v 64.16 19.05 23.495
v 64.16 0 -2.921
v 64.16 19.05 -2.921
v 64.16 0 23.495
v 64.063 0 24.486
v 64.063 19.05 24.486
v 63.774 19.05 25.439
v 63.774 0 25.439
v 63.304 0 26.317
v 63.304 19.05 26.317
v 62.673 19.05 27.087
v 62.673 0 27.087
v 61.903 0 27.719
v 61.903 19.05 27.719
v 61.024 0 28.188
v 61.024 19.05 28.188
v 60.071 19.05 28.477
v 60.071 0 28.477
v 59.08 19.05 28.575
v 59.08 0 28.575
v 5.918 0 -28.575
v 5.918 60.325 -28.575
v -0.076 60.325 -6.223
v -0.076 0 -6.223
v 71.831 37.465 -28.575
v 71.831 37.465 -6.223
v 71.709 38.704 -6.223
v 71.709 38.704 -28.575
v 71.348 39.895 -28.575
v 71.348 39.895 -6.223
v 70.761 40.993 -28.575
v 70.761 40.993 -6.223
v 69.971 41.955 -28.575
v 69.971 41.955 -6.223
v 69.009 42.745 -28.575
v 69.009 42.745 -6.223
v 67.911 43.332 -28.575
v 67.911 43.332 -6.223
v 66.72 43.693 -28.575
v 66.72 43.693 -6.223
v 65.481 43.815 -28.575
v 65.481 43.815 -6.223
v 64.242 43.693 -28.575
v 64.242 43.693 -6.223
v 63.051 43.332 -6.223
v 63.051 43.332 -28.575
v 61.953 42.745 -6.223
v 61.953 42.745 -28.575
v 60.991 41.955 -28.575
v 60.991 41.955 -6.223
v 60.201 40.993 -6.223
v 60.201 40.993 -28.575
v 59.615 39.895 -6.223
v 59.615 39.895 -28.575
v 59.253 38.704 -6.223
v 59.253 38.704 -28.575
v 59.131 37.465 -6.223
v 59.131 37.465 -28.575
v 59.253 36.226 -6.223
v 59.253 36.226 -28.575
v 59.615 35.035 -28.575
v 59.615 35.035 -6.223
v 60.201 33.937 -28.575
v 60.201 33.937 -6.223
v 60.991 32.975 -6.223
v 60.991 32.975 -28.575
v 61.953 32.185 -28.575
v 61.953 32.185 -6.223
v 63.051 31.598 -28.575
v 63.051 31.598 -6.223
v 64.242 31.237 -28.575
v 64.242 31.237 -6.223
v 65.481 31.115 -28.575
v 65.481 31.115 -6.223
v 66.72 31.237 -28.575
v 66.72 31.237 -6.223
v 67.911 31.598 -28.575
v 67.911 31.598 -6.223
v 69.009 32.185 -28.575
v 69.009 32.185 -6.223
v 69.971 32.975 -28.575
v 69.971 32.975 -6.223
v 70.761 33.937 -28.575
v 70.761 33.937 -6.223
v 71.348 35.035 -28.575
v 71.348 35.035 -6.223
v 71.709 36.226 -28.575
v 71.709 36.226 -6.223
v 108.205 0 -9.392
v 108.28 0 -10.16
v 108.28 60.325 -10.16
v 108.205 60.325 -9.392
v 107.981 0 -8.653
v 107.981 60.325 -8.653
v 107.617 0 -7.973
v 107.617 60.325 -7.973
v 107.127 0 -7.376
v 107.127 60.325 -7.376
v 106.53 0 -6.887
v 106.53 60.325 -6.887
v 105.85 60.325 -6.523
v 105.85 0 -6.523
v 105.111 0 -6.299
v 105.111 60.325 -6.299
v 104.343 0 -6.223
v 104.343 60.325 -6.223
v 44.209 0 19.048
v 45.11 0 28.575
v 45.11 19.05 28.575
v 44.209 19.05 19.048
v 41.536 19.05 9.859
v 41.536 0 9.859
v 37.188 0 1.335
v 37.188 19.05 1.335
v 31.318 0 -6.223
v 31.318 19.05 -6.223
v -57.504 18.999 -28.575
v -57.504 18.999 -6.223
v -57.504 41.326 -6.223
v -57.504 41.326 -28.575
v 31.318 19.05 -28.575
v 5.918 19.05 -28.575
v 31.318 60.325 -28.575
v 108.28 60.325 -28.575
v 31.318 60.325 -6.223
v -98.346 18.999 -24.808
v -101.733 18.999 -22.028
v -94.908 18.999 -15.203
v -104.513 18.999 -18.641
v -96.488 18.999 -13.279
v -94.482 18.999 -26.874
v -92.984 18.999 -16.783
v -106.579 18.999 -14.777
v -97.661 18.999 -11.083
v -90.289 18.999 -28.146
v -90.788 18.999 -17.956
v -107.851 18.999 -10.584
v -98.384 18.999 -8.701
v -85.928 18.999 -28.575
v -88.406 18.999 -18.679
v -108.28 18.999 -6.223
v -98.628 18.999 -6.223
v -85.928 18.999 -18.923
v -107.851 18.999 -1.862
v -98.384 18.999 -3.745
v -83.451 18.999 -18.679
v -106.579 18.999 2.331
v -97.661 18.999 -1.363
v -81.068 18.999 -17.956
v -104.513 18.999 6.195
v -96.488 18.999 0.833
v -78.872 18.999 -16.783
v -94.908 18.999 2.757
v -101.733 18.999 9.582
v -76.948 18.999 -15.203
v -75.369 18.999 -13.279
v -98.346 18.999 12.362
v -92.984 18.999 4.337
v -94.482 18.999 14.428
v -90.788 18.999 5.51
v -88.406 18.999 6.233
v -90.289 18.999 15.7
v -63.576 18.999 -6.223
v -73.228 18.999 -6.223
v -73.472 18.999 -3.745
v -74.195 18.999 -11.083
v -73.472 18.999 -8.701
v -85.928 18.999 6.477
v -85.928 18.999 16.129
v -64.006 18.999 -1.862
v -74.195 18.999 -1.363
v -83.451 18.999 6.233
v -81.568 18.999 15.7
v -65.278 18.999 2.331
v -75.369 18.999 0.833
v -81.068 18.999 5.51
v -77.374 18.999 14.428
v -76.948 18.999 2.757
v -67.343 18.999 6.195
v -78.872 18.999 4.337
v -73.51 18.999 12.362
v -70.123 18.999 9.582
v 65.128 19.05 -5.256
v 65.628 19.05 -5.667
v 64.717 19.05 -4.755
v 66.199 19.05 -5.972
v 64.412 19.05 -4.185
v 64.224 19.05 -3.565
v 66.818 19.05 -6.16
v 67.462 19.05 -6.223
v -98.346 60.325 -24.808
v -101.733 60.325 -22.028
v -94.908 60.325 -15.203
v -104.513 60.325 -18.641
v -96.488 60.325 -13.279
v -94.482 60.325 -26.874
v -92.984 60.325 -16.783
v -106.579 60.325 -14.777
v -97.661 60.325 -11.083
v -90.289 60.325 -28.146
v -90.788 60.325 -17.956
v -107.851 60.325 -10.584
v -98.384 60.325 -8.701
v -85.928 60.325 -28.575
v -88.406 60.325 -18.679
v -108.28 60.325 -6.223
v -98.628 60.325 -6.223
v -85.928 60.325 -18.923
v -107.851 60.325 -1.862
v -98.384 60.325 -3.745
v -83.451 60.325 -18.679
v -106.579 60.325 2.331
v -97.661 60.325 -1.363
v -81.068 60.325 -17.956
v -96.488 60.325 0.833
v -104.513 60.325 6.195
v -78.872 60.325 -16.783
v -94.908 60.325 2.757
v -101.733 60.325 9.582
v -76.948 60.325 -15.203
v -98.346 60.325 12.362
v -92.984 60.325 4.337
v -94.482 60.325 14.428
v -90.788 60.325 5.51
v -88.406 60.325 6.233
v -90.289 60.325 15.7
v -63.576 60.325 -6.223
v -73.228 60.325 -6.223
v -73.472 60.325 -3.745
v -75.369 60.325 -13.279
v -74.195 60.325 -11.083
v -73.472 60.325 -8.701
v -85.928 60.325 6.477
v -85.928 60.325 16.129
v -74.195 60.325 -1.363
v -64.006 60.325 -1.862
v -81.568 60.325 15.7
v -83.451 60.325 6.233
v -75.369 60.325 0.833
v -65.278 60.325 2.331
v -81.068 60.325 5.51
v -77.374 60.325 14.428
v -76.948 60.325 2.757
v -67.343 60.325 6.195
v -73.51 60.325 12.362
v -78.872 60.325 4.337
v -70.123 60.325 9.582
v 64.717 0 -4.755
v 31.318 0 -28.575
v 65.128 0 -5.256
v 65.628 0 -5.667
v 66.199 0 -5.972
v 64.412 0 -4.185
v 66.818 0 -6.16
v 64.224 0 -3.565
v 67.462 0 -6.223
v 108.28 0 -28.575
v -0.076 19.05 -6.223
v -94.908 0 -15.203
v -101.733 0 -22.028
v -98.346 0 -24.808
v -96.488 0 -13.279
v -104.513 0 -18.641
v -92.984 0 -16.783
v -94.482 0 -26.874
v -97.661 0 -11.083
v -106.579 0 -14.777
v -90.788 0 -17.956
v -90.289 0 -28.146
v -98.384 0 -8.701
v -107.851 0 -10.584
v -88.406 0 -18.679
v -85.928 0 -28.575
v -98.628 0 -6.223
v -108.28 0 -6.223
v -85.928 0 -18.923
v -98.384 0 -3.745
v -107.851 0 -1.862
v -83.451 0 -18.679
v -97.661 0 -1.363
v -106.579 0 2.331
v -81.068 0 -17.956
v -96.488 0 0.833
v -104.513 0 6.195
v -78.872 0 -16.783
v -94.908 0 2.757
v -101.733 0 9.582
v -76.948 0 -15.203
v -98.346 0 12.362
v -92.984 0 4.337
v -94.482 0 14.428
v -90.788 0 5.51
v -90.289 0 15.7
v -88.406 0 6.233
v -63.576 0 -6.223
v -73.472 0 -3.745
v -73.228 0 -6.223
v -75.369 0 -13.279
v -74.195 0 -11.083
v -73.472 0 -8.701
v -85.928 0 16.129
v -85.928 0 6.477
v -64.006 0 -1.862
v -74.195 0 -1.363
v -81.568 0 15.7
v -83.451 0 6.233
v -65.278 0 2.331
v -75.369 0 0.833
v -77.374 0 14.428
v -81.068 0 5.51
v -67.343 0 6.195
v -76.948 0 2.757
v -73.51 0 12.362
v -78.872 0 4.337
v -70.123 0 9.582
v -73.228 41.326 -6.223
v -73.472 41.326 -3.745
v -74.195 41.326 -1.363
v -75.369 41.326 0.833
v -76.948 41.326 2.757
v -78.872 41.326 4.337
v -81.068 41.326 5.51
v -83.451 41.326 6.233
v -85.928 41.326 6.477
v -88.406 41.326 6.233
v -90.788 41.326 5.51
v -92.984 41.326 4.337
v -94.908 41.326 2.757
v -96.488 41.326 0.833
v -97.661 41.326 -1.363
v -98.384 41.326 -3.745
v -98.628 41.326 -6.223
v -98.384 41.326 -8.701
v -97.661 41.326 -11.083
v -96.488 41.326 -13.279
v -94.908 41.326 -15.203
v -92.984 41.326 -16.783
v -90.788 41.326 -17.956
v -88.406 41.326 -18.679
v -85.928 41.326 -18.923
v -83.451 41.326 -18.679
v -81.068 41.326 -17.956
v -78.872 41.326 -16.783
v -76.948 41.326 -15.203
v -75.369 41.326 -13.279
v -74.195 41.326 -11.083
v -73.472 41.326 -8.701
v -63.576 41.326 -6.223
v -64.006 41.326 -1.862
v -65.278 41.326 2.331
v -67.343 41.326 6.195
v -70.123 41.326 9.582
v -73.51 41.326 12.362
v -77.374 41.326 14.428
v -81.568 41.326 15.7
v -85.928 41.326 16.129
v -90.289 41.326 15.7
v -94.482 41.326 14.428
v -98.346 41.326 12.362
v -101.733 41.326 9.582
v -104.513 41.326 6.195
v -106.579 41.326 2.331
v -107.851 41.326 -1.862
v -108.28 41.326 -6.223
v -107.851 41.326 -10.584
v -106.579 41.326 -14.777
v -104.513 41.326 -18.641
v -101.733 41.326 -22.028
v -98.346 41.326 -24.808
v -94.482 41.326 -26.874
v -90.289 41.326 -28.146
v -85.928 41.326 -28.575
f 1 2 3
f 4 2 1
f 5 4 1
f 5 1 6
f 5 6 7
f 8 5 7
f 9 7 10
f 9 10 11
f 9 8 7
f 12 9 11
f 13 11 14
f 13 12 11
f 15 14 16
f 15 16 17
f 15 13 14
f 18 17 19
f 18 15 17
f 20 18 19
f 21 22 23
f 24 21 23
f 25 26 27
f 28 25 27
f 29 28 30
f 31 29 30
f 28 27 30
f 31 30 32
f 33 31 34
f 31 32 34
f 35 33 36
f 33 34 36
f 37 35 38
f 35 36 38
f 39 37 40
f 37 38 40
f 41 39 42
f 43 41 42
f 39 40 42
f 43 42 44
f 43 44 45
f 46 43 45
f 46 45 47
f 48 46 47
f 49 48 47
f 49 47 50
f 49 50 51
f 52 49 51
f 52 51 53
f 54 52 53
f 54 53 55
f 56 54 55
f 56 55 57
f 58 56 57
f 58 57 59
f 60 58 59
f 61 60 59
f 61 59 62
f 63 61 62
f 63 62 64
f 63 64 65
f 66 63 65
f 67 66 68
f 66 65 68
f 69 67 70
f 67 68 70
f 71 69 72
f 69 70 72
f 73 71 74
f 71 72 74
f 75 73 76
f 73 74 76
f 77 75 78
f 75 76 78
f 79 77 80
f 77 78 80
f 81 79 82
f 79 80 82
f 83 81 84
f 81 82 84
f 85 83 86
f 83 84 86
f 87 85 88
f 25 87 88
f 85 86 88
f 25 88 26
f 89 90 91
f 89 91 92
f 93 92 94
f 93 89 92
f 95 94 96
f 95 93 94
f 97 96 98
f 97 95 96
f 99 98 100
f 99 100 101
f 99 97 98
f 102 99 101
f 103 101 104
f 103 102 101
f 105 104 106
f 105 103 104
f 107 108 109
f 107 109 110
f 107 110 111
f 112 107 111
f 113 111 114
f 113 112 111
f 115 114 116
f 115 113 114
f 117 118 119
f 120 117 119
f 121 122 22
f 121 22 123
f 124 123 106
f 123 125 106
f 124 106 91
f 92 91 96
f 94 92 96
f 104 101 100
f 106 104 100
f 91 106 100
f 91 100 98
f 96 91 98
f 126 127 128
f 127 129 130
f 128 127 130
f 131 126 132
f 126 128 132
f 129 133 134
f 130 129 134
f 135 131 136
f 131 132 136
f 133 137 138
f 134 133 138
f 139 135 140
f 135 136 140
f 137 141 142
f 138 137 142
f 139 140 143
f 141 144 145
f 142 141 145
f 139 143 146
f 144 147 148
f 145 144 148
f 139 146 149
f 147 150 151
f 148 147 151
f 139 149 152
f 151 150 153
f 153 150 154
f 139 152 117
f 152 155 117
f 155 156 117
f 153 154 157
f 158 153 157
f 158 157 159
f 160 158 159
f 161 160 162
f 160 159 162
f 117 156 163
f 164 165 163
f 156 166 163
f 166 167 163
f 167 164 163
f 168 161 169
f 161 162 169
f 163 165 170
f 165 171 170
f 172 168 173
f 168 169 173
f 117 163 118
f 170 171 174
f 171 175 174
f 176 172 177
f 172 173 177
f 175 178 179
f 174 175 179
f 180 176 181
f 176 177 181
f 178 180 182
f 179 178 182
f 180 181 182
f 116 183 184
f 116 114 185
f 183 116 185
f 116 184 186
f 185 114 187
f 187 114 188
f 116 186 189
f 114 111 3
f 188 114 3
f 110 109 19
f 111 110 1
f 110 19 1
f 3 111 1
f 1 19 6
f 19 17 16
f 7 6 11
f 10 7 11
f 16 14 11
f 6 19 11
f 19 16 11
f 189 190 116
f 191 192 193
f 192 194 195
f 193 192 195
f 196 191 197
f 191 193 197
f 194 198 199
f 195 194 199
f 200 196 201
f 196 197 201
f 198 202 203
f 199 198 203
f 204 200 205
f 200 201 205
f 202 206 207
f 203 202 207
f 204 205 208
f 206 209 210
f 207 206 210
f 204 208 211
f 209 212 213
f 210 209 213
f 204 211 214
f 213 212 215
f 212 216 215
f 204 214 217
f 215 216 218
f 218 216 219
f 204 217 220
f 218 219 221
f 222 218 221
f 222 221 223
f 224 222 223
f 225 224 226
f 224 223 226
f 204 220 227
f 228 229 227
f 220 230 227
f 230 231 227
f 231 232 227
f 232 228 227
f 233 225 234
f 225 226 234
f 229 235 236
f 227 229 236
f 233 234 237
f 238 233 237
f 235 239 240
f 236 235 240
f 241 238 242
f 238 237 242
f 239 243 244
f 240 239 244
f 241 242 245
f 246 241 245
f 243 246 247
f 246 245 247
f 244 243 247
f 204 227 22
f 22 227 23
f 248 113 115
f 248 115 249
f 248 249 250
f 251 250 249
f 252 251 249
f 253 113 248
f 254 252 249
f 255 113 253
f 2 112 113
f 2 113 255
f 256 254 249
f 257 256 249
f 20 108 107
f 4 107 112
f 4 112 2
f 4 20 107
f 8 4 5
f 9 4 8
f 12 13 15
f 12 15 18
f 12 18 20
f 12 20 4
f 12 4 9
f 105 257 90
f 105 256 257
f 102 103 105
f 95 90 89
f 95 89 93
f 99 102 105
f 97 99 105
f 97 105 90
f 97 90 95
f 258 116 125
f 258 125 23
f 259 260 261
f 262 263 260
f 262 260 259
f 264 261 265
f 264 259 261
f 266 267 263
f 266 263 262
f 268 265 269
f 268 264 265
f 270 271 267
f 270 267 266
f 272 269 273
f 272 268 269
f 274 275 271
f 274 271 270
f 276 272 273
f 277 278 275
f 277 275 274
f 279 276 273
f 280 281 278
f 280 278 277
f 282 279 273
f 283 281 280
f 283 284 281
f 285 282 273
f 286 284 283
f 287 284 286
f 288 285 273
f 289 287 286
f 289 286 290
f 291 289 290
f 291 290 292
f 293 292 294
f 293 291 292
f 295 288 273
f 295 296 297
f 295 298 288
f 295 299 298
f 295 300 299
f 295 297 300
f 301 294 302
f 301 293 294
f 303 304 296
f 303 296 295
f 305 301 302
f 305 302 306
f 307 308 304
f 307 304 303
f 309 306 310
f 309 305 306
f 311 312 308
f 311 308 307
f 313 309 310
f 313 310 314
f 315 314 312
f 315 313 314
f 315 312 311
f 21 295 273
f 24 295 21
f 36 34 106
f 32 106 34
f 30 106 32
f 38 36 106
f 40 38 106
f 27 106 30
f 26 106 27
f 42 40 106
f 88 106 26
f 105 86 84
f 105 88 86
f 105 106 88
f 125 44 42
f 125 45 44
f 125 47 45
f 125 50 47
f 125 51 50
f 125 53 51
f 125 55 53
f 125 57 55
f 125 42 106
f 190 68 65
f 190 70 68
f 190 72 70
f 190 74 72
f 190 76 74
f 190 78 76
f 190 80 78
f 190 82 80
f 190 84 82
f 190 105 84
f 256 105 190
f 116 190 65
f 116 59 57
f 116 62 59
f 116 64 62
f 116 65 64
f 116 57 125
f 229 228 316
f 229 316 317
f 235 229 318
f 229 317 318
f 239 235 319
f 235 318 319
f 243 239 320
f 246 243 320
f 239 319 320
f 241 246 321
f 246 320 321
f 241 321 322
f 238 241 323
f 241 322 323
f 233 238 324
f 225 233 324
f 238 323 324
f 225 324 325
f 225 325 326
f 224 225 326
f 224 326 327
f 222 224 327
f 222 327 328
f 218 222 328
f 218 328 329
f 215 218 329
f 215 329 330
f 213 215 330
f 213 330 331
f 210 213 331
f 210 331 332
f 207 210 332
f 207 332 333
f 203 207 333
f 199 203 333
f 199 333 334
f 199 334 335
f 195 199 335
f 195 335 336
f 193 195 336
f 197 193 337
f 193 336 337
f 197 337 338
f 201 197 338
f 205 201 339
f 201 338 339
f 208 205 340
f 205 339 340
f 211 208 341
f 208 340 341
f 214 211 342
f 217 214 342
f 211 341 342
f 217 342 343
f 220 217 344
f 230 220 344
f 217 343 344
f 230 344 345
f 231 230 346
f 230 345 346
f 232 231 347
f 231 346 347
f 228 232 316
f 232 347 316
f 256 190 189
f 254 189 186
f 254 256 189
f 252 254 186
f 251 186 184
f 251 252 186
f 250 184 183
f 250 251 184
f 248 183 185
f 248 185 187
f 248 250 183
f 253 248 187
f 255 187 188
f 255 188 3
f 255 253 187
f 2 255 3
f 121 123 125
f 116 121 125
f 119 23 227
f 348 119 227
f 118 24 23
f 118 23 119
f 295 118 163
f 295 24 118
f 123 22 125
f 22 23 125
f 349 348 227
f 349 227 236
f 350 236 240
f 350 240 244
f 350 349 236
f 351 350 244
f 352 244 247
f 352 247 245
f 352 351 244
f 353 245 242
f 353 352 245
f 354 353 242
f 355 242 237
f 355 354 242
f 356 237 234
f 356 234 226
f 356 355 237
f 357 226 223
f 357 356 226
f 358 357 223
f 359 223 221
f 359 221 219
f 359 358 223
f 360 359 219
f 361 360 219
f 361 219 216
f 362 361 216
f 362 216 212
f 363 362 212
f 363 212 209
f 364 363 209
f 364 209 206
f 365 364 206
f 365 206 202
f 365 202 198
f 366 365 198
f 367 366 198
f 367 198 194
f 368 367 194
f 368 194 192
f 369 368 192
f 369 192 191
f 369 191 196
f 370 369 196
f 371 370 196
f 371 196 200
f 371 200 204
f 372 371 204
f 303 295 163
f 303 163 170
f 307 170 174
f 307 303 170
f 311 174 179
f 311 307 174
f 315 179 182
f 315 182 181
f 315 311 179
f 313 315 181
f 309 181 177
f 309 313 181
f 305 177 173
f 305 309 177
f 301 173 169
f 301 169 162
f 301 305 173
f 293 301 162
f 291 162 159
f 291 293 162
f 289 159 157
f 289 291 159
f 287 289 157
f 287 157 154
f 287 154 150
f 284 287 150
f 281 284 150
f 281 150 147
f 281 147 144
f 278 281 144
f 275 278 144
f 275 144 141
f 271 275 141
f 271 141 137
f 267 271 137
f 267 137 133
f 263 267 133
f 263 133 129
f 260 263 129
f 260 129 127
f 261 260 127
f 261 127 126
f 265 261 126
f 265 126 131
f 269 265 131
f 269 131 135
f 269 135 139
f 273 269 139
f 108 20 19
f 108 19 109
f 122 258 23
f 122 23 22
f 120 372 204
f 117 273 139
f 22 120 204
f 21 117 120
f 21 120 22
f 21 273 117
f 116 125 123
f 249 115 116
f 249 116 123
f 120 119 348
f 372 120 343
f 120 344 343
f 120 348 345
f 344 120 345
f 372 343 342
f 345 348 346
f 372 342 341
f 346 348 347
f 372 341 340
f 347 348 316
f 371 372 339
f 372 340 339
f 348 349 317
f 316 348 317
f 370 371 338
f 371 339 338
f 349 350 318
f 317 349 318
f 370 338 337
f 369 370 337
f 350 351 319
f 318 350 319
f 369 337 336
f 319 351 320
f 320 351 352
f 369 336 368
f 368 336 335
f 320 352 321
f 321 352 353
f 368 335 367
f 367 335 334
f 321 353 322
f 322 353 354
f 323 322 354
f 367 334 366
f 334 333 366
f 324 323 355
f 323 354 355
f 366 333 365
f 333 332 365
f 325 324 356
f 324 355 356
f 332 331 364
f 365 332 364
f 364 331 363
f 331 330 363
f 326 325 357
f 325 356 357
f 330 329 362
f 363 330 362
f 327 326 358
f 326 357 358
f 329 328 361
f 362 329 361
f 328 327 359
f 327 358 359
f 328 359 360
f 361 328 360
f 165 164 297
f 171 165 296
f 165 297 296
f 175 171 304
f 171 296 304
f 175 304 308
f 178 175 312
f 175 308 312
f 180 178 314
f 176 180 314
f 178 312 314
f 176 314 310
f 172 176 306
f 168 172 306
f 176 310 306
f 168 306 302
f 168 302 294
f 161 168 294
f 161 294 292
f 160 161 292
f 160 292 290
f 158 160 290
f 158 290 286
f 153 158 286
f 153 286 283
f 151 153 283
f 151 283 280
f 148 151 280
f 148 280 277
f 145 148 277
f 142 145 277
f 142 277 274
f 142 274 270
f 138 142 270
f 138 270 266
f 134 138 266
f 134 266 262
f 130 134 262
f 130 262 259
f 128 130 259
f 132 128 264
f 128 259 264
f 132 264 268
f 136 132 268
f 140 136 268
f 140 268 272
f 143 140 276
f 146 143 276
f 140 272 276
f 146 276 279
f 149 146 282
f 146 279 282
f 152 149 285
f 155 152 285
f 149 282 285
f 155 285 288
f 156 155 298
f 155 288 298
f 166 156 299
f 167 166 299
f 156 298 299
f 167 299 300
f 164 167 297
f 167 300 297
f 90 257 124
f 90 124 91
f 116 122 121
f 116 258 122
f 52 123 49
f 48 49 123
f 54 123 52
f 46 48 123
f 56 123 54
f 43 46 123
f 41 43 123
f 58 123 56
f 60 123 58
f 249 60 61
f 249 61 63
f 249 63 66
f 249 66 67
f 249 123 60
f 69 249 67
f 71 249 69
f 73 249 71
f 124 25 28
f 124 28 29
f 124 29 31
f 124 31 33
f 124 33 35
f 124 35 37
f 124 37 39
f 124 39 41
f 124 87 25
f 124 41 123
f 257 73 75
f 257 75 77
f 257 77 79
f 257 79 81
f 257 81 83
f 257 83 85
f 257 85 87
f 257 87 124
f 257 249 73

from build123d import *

# Parameters (mm, degrees)
F1_DEPTH = 60.325
F2_DEPTH = 19.05
F0_R     = 12.7
F3_DEPTH = 60.325
F4_DEPTH = 60.325
F5_DEPTH = 19.05
F6_W     = 6.072669208
F6_H     = 22.3266
F6_W_2   = 55.7985371435
F7_DEPTH = 105.41
F8_R     = 6.35
F9_DEPTH = 22.353


with BuildPart() as f1:
    # F0 (on Front) → F1 (new body)
    with BuildSketch(Plane.XZ):
        with BuildLine():
            Line((31.3182, -28.575), (108.2802, -28.575))
            Line((108.2802, -28.575), (108.2802, -10.16))
            ThreePointArc((108.2802, -10.16), (107.1270793975, -7.3761206025), (104.3432, -6.223))
            Line((104.3432, -6.223), (67.4624, -6.223))
            Line((67.4624, -6.223), (31.3182, -6.223))
            Line((31.3182, -6.223), (31.3182, -28.575))
        make_face()
    extrude(amount=-F1_DEPTH)

    # F0 (on Front) → F2 (join)
    with BuildSketch(Plane.XZ):
        with BuildLine():
            ThreePointArc((45.1104, 28.575), (41.5362153616, 9.8593576341), (31.3182, -6.223))
            Line((31.3182, -6.223), (67.4624, -6.223))
            ThreePointArc((67.4624, -6.223), (65.1275334085, -5.2558665915), (64.1604, -2.921))
            Line((64.1604, -2.921), (64.1604, 23.495))
            ThreePointArc((64.1604, 23.495), (62.6725024484, 27.0871024484), (59.0804, 28.575))
            Line((59.0804, 28.575), (45.1104, 28.575))
        make_face()
    extrude(amount=-F2_DEPTH)

    # F8 (on face) → F9 (cut, through all)
    with BuildSketch(Plane.XY.offset(-6.223)):
        with Locations((65.4812, 37.465)):
            Circle(F8_R)
    extrude(amount=-F9_DEPTH, mode=Mode.SUBTRACT)


with BuildPart() as f3:
    # F0 (on Front) → F3 (new body)
    with BuildSketch(Plane.XZ):
        with BuildLine():
            Line((-85.9282, -28.575), (5.9182, -28.575))
            Line((5.9182, -28.575), (-0.0762, -6.223))
            Line((-0.0762, -6.223), (-63.5762, -6.223))
            ThreePointArc((-63.5762, -6.223), (-101.7334507731, 9.5822507731), (-85.9282, -28.575))
        make_face()
        with Locations((-85.9282, -6.223)):
            Circle(F0_R, mode=Mode.SUBTRACT)
    extrude(amount=-F3_DEPTH)

    # F6 (on face) → F7 (cut, symmetric)
    with BuildSketch(Plane.XY.offset(-6.223)):
        with Locations((-60.539865396, 30.1625)):
            Rectangle(F6_W, F6_H)
        with Locations((-91.4754685718, 30.1625)):
            Rectangle(F6_W_2, F6_H)
    extrude(amount=F7_DEPTH, both=True, mode=Mode.SUBTRACT)


with BuildPart() as f4:
    # F0 (on Front) → F4 (new body)
    with BuildSketch(Plane.XZ):
        Polygon((5.9182, -28.575), (31.3182, -28.575), (31.3182, -6.223), (-0.0762, -6.223), align=None)
    extrude(amount=-F4_DEPTH)

    # F0 (on Front) → F5 (cut)
    with BuildSketch(Plane.XZ):
        Polygon((5.9182, -28.575), (31.3182, -28.575), (31.3182, -6.223), (-0.0762, -6.223), align=None)
    extrude(amount=-F5_DEPTH, mode=Mode.SUBTRACT)


solid = Compound([f1.part, f3.part, f4.part])
